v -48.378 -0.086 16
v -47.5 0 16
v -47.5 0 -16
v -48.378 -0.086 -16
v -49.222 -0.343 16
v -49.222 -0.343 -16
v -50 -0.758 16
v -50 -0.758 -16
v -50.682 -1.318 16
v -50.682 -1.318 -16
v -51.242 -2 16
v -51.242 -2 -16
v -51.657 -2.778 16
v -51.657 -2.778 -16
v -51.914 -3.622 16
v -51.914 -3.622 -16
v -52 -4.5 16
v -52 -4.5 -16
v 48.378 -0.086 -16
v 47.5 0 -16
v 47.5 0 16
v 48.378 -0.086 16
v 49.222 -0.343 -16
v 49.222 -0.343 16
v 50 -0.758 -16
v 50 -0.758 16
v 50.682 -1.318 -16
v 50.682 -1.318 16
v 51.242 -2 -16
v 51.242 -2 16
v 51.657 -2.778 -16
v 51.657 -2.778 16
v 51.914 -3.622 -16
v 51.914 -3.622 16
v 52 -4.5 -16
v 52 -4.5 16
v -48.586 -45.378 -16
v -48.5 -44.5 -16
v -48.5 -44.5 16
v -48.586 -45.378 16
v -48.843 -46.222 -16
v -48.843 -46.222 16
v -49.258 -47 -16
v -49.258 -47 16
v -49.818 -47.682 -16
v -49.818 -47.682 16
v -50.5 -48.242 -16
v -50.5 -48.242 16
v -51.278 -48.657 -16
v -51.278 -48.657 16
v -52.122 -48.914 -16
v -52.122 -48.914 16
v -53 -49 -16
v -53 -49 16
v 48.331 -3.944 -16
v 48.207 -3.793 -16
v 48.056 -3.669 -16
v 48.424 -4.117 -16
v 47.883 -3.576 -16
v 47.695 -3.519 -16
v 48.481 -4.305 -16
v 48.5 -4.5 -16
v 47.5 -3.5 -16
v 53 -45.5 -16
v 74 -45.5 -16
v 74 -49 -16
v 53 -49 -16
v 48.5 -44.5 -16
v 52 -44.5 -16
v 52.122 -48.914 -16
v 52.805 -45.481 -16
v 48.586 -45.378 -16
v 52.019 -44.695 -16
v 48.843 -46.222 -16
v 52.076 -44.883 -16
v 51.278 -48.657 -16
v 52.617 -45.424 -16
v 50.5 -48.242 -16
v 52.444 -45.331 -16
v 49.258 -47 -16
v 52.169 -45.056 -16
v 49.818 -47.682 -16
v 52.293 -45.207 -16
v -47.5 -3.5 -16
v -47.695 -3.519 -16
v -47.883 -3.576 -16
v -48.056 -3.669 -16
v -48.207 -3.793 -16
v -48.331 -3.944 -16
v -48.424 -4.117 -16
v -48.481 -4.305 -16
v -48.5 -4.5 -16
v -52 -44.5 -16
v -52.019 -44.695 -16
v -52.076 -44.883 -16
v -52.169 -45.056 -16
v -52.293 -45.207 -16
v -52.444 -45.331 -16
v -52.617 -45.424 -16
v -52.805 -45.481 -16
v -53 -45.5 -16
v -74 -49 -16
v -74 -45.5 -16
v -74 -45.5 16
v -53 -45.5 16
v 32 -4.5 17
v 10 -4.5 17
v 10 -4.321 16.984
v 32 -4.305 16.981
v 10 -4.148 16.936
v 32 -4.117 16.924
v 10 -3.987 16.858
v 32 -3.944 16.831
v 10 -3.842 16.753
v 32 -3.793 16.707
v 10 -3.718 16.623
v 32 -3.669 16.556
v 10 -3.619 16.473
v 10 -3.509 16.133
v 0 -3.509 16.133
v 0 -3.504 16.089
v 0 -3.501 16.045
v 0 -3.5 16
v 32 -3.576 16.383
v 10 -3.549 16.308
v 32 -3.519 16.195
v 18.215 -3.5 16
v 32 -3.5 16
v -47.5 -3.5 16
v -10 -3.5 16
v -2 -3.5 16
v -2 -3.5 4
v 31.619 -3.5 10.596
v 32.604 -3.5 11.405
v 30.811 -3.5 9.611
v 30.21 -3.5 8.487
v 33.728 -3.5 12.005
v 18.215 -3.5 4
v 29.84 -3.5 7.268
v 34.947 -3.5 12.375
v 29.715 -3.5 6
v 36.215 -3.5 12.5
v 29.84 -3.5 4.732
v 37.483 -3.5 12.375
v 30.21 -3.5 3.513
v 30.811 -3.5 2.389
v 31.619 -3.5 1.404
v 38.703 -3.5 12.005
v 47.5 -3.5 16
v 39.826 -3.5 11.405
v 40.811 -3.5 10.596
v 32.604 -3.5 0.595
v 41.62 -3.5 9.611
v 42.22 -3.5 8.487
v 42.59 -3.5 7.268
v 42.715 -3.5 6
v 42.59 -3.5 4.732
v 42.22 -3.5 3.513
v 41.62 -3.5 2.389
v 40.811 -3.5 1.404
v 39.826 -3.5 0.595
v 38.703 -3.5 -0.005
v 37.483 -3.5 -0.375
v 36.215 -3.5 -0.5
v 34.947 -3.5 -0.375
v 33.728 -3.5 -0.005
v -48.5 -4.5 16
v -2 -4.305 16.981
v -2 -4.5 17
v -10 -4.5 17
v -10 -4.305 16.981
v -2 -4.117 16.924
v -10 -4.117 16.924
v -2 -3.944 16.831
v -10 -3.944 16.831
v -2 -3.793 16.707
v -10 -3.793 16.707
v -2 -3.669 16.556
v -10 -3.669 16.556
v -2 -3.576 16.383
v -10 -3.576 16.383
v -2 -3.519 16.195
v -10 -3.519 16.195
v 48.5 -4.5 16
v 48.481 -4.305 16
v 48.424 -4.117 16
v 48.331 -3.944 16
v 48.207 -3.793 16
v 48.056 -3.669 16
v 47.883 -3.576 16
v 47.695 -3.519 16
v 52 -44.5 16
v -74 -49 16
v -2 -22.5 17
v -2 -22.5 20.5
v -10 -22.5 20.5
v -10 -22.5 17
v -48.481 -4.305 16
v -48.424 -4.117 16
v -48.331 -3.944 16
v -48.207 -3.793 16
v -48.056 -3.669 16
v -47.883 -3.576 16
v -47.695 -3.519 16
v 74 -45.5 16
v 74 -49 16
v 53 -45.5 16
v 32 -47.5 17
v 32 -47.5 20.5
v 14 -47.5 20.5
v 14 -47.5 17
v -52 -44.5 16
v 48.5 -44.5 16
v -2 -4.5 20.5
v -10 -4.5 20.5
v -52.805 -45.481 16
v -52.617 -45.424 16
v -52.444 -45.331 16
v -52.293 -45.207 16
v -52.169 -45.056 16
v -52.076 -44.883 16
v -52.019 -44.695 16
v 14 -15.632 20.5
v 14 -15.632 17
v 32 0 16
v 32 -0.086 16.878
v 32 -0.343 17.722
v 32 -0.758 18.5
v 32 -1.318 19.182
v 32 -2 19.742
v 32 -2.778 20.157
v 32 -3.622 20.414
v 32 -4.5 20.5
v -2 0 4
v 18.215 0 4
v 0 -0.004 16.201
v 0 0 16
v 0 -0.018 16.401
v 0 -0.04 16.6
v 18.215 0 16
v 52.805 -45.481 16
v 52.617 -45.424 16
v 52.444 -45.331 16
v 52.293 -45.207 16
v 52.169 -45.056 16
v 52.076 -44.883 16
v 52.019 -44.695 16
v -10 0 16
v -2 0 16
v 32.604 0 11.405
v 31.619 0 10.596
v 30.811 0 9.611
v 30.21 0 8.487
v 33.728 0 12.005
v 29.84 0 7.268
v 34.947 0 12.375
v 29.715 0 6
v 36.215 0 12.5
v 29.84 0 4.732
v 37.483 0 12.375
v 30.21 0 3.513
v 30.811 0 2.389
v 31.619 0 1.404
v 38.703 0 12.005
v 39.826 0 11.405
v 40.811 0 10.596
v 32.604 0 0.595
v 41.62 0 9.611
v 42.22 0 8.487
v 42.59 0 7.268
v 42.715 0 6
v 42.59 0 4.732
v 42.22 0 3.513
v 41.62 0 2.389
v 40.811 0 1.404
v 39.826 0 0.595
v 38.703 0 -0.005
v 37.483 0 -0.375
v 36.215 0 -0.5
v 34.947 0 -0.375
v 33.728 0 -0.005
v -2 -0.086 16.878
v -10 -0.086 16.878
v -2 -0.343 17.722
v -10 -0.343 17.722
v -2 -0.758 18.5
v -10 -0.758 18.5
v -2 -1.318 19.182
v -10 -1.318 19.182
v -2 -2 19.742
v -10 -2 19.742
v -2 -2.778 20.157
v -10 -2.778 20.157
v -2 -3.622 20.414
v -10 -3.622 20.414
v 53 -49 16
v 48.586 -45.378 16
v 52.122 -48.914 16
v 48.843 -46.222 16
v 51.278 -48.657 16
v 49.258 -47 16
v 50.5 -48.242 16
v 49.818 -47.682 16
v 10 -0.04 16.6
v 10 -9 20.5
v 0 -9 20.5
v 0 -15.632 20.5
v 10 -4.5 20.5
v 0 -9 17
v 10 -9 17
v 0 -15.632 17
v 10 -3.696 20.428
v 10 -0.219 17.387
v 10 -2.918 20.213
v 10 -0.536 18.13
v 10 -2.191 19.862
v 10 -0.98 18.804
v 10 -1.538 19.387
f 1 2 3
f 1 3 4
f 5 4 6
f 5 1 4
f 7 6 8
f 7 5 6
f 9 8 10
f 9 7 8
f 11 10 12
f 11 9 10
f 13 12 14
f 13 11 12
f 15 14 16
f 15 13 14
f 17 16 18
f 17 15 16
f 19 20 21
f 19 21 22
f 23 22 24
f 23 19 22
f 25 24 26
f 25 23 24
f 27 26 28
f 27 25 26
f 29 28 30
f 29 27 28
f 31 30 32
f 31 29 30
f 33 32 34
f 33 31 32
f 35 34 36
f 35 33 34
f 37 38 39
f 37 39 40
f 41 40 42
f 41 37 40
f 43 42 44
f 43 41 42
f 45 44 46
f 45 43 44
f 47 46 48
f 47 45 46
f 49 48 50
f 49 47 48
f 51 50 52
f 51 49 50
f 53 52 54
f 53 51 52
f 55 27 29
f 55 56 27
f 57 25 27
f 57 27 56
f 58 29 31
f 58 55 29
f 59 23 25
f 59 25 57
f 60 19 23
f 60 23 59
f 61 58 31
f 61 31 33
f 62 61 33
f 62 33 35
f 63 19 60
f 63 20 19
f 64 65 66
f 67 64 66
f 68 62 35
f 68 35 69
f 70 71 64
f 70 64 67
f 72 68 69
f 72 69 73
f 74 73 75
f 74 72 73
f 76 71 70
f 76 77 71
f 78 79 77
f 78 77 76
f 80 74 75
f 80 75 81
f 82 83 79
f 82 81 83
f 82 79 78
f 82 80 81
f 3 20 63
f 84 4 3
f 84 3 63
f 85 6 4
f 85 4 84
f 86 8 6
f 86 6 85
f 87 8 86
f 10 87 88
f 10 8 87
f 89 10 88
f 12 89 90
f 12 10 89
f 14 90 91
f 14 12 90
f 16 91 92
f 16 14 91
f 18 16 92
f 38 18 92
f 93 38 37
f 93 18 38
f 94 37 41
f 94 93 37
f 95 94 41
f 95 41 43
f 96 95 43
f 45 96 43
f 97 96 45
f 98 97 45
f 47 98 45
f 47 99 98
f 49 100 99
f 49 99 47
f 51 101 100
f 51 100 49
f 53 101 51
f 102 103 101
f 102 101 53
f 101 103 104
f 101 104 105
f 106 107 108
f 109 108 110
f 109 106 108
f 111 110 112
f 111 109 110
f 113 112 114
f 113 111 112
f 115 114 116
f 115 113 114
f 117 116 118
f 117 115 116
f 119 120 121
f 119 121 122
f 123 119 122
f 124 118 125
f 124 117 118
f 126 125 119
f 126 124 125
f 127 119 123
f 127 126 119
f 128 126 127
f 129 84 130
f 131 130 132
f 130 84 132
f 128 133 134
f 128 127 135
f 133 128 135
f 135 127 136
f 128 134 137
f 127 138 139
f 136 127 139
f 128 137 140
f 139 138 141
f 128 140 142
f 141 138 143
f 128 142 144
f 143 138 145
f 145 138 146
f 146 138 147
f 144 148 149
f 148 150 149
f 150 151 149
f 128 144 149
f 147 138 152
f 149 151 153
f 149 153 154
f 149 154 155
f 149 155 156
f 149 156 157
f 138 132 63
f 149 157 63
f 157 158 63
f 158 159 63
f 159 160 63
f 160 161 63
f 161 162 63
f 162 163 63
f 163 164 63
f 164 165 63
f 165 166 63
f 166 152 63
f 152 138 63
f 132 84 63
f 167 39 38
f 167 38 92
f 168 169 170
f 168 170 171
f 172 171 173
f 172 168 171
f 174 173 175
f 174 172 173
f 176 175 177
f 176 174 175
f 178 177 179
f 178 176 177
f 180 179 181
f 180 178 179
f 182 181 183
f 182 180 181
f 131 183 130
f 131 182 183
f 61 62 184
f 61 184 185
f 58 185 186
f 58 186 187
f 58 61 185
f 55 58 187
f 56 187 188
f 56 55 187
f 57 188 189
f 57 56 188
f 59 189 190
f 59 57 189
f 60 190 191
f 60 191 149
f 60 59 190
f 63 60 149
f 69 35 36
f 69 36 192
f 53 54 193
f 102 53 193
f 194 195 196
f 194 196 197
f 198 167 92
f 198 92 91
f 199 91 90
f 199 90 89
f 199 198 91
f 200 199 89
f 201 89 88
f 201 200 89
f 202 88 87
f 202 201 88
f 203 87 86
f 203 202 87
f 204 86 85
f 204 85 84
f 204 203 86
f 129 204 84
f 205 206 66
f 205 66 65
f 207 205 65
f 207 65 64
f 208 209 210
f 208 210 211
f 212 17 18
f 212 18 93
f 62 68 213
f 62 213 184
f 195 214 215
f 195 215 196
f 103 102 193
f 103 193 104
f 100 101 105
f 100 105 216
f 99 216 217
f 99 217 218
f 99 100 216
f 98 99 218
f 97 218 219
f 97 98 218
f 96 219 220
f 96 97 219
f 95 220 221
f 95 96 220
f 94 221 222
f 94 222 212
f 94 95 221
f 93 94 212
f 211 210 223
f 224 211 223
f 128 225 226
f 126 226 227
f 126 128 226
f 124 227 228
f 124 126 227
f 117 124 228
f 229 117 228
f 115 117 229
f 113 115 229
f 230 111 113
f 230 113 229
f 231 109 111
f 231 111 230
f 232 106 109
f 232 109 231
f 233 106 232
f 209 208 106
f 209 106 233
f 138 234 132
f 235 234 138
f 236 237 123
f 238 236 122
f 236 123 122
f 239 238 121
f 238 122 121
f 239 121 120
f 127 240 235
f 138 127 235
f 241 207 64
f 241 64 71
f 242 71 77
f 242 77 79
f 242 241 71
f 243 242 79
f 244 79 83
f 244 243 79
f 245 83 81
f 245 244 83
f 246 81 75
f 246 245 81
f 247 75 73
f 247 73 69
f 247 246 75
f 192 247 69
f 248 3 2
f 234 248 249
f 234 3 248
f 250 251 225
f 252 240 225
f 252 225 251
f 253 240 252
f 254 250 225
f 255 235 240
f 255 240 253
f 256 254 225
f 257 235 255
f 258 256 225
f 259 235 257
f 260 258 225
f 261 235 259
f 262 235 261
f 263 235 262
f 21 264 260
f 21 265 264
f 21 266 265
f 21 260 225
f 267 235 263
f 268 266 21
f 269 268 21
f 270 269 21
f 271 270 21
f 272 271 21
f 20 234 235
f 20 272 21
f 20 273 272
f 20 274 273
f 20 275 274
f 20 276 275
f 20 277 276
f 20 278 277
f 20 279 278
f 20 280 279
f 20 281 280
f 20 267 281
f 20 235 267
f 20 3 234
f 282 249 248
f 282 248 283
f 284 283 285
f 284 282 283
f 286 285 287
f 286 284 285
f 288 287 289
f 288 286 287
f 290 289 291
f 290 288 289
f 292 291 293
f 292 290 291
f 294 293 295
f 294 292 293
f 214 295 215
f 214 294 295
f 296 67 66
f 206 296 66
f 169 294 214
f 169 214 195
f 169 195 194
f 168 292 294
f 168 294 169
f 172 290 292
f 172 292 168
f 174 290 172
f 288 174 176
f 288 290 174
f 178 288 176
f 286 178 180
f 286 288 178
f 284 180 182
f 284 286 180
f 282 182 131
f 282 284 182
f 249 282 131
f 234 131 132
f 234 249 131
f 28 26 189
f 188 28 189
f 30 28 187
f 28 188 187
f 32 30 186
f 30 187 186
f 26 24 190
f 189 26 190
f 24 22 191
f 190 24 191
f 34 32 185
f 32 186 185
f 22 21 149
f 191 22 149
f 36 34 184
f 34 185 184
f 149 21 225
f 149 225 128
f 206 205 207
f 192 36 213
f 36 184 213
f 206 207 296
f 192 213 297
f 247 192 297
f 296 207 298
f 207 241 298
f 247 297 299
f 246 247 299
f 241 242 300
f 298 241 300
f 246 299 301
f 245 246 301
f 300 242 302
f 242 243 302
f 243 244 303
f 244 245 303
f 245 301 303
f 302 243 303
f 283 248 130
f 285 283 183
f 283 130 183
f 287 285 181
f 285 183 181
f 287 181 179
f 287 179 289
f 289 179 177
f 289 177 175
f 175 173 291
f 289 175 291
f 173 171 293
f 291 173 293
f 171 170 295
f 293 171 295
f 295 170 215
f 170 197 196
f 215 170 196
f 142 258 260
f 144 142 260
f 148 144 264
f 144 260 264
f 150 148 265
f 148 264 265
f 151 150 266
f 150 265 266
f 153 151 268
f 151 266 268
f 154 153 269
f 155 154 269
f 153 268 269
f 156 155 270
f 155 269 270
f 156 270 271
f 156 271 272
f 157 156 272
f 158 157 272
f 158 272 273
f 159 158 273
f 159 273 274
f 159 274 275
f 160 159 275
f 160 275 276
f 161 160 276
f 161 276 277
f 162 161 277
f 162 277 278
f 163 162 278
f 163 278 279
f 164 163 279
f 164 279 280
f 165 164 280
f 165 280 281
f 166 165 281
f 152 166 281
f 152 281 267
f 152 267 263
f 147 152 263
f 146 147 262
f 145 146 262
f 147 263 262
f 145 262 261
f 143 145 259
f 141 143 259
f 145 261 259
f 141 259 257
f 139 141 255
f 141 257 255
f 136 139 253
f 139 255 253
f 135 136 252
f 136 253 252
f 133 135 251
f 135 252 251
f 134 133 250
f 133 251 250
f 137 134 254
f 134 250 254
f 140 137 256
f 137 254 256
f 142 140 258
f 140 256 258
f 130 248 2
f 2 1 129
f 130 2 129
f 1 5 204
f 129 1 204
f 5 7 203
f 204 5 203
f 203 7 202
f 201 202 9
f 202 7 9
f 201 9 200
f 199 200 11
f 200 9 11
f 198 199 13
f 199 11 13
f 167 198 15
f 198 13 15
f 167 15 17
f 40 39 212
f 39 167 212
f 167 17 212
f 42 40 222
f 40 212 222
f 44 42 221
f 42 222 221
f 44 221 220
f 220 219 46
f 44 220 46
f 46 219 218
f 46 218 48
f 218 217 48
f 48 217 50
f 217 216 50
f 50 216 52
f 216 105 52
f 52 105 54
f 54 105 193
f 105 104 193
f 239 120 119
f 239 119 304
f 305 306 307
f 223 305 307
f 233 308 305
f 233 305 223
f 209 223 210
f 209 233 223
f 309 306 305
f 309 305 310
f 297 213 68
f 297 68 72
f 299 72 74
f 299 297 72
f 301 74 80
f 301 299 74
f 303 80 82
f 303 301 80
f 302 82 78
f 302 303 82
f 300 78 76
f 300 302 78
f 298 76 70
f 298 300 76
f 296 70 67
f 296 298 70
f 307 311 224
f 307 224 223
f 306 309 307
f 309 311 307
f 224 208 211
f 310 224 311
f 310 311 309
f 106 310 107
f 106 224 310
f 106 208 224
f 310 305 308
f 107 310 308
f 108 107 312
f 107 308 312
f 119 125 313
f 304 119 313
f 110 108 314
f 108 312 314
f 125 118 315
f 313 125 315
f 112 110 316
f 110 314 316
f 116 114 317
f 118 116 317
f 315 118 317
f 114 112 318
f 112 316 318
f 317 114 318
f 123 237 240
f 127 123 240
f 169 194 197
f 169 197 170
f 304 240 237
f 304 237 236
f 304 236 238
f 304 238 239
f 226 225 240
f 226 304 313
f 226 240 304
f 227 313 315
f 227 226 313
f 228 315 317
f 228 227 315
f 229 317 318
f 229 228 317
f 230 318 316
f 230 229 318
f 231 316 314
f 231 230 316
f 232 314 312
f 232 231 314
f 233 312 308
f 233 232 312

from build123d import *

# Parameters (mm, degrees)
SKETCH1_W               = 95
SKETCH1_H               = 32
BASE_FLANGE1_DEPTH      = 3.5
EDGE_FLANGE1_DEPTH      = 32
EDGE_FLANGE1_BEND_DEPTH = 32
EDGE_FLANGE2_DEPTH      = 32
EDGE_FLANGE2_BEND_DEPTH = 32
EDGE_FLANGE3_DEPTH      = 8
EDGE_FLANGE4_DEPTH      = 32
SKETCH30_R              = 6.5
SKETCH30_R_2            = 4
SKETCH30_W              = 20.215069336
SKETCH30_H              = 12
CUT_EXTRUDE1_DEPTH      = 10
CUT_EXTRUDE2_OUTLINE_W  = 31.867862703
CUT_EXTRUDE2_OUTLINE_H  = 3.5
CUT_EXTRUDE2_DEPTH      = 14
CUT_EXTRUDE2_2_DEPTH    = 10


# Read off the part's stored shape, not the designer's step: Cut-Extrude2
# Sheet-metal steps are written as plain solids
with BuildPart() as part:
    # Sketch1 → Base-Flange1 (new body)
    with BuildSketch(Plane(origin=(0, 0, 0), x_dir=(1, 0, 0), z_dir=(0, 1, 0))):
        Rectangle(SKETCH1_W, SKETCH1_H)
    extrude(amount=-BASE_FLANGE1_DEPTH)

    # Edge-Flange1 section (across the edge) → Edge-Flange1 (add)
    with BuildSketch(Plane(origin=(48.5, -3.5, -16), x_dir=(-1, 0, 0), z_dir=(0, 0, 1))):
        with BuildLine():
            Line((-3.5, 1), (-3.5, 41))
            Line((-3.5, 41), (0, 41))
            Line((0, 41), (0, 1))
            ThreePointArc((0, 1), (0.292893219, 0.292893219), (1, 0))
            Line((1, 0), (1, -3.5))
            ThreePointArc((1, -3.5), (-2.181980515, -2.181980515), (-3.5, 1))
        make_face()
    extrude(amount=EDGE_FLANGE1_DEPTH)

    # Edge-Flange1 section 2 (across the edge) → Edge-Flange1 bend (add)
    with BuildSketch(Plane(origin=(-48.5, -3.5, 16), x_dir=(1, 0, 0), z_dir=(0, 0, -1))):
        with BuildLine():
            Line((-3.5, 1), (-3.5, 41))
            Line((-3.5, 41), (0, 41))
            Line((0, 41), (0, 1))
            ThreePointArc((0, 1), (0.292893219, 0.292893219), (1, 0))
            Line((1, 0), (1, -3.5))
            ThreePointArc((1, -3.5), (-2.181980515, -2.181980515), (-3.5, 1))
        make_face()
    extrude(amount=EDGE_FLANGE1_BEND_DEPTH)

    # Edge-Flange2 section (across the edge) → Edge-Flange2 (add)
    with BuildSketch(Plane(origin=(52, -45.5, 16), x_dir=(0, 1, 0), z_dir=(0, 0, -1))):
        with BuildLine():
            Line((-3.5, 1), (-3.5, 22))
            Line((-3.5, 22), (0, 22))
            Line((0, 22), (0, 1))
            ThreePointArc((0, 1), (0.292893219, 0.292893219), (1, 0))
            Line((1, 0), (1, -3.5))
            ThreePointArc((1, -3.5), (-2.181980515, -2.181980515), (-3.5, 1))
        make_face()
    extrude(amount=EDGE_FLANGE2_DEPTH)

    # Edge-Flange2 section 2 (across the edge) → Edge-Flange2 bend (add)
    with BuildSketch(Plane(origin=(-52, -45.5, -16), x_dir=(0, 1, 0), z_dir=(0, 0, 1))):
        with BuildLine():
            Line((-3.5, 1), (-3.5, 22))
            Line((-3.5, 22), (0, 22))
            Line((0, 22), (0, 1))
            ThreePointArc((0, 1), (0.292893219, 0.292893219), (1, 0))
            Line((1, 0), (1, -3.5))
            ThreePointArc((1, -3.5), (-2.181980515, -2.181980515), (-3.5, 1))
        make_face()
    extrude(amount=EDGE_FLANGE2_BEND_DEPTH)

    # Edge-Flange3 section (across the edge) → Edge-Flange3 (add)
    with BuildSketch(Plane(origin=(-2, -3.5, 17), x_dir=(0, 0, -1), z_dir=(-1, 0, 0))):
        with BuildLine():
            Line((-3.5, 1), (-3.5, 19))
            Line((-3.5, 19), (0, 19))
            Line((0, 19), (0, 1))
            ThreePointArc((0, 1), (0.292893219, 0.292893219), (1, 0))
            Line((1, 0), (1, -3.5))
            ThreePointArc((1, -3.5), (-2.181980515, -2.181980515), (-3.5, 1))
        make_face()
    extrude(amount=EDGE_FLANGE3_DEPTH)

    # Edge-Flange4 section (across the edge) → Edge-Flange4 (add)
    with BuildSketch(Plane(origin=(32, -3.5, 17), x_dir=(0, 0, -1), z_dir=(-1, 0, 0))):
        with BuildLine():
            Line((-3.5, 1), (-3.5, 44))
            Line((-3.5, 44), (0, 44))
            Line((0, 44), (0, 1))
            ThreePointArc((0, 1), (0.292893219, 0.292893219), (1, 0))
            Line((1, 0), (1, -3.5))
            ThreePointArc((1, -3.5), (-2.181980515, -2.181980515), (-3.5, 1))
        make_face()
    extrude(amount=EDGE_FLANGE4_DEPTH)

    # Sketch30 → Cut-Extrude1 (cut)
    # profile 1 of 2: a face of its own
    with BuildSketch(Plane(origin=(0, 0, 0), x_dir=(1, 0, 0), z_dir=(0, 1, 0))):
        with Locations(Location((36.215069336, -6, 0), (0, 0, 270))):
            Circle(SKETCH30_R)
        with Locations((36.215069336, -6)):
            Circle(SKETCH30_R_2, mode=Mode.SUBTRACT)
    # profile 2 of 2: a face of its own
    with BuildSketch(Plane(origin=(0, 0, 0), x_dir=(1, 0, 0), z_dir=(0, 1, 0))):
        with Locations((8.107534668, -10)):
            Rectangle(SKETCH30_W, SKETCH30_H)
    extrude(amount=-CUT_EXTRUDE1_DEPTH, mode=Mode.SUBTRACT)


with BuildPart() as cut_extrude1_kept_piece:
    # of the separate pieces the step leaves, the one the design keeps (cut_extrude1_pieces_kept)
    add(part.part.solids().sort_by_distance((-47.5, -3.5, -16))[0])

    # Cut-Extrude2 outline → Cut-Extrude2 (cut)
    with BuildSketch(Plane.YZ):
        with Locations((-31.566068648, 18.75)):
            Rectangle(CUT_EXTRUDE2_OUTLINE_W, CUT_EXTRUDE2_OUTLINE_H)
    extrude(amount=CUT_EXTRUDE2_DEPTH, mode=Mode.SUBTRACT)

    # Cut-Extrude2 2 outline → Cut-Extrude2 2 (cut)
    with BuildSketch(Plane.YZ):
        with BuildLine():
            Line((-9, 20.5), (-9, 17))
            Line((-9, 17), (-4.5, 17))
            ThreePointArc((-4.5, 17), (-3.841719411, 16.752772652), (-3.50892875, 16.133333333))
            Line((-3.50892875, 16.133333333), (-0.040179376, 16.6))
            ThreePointArc((-0.040179376, 16.6), (-1.537737352, 19.387476937), (-4.5, 20.5))
            Line((-4.5, 20.5), (-9, 20.5))
        make_face()
    extrude(amount=CUT_EXTRUDE2_2_DEPTH, mode=Mode.SUBTRACT)


solid = cut_extrude1_kept_piece.part
